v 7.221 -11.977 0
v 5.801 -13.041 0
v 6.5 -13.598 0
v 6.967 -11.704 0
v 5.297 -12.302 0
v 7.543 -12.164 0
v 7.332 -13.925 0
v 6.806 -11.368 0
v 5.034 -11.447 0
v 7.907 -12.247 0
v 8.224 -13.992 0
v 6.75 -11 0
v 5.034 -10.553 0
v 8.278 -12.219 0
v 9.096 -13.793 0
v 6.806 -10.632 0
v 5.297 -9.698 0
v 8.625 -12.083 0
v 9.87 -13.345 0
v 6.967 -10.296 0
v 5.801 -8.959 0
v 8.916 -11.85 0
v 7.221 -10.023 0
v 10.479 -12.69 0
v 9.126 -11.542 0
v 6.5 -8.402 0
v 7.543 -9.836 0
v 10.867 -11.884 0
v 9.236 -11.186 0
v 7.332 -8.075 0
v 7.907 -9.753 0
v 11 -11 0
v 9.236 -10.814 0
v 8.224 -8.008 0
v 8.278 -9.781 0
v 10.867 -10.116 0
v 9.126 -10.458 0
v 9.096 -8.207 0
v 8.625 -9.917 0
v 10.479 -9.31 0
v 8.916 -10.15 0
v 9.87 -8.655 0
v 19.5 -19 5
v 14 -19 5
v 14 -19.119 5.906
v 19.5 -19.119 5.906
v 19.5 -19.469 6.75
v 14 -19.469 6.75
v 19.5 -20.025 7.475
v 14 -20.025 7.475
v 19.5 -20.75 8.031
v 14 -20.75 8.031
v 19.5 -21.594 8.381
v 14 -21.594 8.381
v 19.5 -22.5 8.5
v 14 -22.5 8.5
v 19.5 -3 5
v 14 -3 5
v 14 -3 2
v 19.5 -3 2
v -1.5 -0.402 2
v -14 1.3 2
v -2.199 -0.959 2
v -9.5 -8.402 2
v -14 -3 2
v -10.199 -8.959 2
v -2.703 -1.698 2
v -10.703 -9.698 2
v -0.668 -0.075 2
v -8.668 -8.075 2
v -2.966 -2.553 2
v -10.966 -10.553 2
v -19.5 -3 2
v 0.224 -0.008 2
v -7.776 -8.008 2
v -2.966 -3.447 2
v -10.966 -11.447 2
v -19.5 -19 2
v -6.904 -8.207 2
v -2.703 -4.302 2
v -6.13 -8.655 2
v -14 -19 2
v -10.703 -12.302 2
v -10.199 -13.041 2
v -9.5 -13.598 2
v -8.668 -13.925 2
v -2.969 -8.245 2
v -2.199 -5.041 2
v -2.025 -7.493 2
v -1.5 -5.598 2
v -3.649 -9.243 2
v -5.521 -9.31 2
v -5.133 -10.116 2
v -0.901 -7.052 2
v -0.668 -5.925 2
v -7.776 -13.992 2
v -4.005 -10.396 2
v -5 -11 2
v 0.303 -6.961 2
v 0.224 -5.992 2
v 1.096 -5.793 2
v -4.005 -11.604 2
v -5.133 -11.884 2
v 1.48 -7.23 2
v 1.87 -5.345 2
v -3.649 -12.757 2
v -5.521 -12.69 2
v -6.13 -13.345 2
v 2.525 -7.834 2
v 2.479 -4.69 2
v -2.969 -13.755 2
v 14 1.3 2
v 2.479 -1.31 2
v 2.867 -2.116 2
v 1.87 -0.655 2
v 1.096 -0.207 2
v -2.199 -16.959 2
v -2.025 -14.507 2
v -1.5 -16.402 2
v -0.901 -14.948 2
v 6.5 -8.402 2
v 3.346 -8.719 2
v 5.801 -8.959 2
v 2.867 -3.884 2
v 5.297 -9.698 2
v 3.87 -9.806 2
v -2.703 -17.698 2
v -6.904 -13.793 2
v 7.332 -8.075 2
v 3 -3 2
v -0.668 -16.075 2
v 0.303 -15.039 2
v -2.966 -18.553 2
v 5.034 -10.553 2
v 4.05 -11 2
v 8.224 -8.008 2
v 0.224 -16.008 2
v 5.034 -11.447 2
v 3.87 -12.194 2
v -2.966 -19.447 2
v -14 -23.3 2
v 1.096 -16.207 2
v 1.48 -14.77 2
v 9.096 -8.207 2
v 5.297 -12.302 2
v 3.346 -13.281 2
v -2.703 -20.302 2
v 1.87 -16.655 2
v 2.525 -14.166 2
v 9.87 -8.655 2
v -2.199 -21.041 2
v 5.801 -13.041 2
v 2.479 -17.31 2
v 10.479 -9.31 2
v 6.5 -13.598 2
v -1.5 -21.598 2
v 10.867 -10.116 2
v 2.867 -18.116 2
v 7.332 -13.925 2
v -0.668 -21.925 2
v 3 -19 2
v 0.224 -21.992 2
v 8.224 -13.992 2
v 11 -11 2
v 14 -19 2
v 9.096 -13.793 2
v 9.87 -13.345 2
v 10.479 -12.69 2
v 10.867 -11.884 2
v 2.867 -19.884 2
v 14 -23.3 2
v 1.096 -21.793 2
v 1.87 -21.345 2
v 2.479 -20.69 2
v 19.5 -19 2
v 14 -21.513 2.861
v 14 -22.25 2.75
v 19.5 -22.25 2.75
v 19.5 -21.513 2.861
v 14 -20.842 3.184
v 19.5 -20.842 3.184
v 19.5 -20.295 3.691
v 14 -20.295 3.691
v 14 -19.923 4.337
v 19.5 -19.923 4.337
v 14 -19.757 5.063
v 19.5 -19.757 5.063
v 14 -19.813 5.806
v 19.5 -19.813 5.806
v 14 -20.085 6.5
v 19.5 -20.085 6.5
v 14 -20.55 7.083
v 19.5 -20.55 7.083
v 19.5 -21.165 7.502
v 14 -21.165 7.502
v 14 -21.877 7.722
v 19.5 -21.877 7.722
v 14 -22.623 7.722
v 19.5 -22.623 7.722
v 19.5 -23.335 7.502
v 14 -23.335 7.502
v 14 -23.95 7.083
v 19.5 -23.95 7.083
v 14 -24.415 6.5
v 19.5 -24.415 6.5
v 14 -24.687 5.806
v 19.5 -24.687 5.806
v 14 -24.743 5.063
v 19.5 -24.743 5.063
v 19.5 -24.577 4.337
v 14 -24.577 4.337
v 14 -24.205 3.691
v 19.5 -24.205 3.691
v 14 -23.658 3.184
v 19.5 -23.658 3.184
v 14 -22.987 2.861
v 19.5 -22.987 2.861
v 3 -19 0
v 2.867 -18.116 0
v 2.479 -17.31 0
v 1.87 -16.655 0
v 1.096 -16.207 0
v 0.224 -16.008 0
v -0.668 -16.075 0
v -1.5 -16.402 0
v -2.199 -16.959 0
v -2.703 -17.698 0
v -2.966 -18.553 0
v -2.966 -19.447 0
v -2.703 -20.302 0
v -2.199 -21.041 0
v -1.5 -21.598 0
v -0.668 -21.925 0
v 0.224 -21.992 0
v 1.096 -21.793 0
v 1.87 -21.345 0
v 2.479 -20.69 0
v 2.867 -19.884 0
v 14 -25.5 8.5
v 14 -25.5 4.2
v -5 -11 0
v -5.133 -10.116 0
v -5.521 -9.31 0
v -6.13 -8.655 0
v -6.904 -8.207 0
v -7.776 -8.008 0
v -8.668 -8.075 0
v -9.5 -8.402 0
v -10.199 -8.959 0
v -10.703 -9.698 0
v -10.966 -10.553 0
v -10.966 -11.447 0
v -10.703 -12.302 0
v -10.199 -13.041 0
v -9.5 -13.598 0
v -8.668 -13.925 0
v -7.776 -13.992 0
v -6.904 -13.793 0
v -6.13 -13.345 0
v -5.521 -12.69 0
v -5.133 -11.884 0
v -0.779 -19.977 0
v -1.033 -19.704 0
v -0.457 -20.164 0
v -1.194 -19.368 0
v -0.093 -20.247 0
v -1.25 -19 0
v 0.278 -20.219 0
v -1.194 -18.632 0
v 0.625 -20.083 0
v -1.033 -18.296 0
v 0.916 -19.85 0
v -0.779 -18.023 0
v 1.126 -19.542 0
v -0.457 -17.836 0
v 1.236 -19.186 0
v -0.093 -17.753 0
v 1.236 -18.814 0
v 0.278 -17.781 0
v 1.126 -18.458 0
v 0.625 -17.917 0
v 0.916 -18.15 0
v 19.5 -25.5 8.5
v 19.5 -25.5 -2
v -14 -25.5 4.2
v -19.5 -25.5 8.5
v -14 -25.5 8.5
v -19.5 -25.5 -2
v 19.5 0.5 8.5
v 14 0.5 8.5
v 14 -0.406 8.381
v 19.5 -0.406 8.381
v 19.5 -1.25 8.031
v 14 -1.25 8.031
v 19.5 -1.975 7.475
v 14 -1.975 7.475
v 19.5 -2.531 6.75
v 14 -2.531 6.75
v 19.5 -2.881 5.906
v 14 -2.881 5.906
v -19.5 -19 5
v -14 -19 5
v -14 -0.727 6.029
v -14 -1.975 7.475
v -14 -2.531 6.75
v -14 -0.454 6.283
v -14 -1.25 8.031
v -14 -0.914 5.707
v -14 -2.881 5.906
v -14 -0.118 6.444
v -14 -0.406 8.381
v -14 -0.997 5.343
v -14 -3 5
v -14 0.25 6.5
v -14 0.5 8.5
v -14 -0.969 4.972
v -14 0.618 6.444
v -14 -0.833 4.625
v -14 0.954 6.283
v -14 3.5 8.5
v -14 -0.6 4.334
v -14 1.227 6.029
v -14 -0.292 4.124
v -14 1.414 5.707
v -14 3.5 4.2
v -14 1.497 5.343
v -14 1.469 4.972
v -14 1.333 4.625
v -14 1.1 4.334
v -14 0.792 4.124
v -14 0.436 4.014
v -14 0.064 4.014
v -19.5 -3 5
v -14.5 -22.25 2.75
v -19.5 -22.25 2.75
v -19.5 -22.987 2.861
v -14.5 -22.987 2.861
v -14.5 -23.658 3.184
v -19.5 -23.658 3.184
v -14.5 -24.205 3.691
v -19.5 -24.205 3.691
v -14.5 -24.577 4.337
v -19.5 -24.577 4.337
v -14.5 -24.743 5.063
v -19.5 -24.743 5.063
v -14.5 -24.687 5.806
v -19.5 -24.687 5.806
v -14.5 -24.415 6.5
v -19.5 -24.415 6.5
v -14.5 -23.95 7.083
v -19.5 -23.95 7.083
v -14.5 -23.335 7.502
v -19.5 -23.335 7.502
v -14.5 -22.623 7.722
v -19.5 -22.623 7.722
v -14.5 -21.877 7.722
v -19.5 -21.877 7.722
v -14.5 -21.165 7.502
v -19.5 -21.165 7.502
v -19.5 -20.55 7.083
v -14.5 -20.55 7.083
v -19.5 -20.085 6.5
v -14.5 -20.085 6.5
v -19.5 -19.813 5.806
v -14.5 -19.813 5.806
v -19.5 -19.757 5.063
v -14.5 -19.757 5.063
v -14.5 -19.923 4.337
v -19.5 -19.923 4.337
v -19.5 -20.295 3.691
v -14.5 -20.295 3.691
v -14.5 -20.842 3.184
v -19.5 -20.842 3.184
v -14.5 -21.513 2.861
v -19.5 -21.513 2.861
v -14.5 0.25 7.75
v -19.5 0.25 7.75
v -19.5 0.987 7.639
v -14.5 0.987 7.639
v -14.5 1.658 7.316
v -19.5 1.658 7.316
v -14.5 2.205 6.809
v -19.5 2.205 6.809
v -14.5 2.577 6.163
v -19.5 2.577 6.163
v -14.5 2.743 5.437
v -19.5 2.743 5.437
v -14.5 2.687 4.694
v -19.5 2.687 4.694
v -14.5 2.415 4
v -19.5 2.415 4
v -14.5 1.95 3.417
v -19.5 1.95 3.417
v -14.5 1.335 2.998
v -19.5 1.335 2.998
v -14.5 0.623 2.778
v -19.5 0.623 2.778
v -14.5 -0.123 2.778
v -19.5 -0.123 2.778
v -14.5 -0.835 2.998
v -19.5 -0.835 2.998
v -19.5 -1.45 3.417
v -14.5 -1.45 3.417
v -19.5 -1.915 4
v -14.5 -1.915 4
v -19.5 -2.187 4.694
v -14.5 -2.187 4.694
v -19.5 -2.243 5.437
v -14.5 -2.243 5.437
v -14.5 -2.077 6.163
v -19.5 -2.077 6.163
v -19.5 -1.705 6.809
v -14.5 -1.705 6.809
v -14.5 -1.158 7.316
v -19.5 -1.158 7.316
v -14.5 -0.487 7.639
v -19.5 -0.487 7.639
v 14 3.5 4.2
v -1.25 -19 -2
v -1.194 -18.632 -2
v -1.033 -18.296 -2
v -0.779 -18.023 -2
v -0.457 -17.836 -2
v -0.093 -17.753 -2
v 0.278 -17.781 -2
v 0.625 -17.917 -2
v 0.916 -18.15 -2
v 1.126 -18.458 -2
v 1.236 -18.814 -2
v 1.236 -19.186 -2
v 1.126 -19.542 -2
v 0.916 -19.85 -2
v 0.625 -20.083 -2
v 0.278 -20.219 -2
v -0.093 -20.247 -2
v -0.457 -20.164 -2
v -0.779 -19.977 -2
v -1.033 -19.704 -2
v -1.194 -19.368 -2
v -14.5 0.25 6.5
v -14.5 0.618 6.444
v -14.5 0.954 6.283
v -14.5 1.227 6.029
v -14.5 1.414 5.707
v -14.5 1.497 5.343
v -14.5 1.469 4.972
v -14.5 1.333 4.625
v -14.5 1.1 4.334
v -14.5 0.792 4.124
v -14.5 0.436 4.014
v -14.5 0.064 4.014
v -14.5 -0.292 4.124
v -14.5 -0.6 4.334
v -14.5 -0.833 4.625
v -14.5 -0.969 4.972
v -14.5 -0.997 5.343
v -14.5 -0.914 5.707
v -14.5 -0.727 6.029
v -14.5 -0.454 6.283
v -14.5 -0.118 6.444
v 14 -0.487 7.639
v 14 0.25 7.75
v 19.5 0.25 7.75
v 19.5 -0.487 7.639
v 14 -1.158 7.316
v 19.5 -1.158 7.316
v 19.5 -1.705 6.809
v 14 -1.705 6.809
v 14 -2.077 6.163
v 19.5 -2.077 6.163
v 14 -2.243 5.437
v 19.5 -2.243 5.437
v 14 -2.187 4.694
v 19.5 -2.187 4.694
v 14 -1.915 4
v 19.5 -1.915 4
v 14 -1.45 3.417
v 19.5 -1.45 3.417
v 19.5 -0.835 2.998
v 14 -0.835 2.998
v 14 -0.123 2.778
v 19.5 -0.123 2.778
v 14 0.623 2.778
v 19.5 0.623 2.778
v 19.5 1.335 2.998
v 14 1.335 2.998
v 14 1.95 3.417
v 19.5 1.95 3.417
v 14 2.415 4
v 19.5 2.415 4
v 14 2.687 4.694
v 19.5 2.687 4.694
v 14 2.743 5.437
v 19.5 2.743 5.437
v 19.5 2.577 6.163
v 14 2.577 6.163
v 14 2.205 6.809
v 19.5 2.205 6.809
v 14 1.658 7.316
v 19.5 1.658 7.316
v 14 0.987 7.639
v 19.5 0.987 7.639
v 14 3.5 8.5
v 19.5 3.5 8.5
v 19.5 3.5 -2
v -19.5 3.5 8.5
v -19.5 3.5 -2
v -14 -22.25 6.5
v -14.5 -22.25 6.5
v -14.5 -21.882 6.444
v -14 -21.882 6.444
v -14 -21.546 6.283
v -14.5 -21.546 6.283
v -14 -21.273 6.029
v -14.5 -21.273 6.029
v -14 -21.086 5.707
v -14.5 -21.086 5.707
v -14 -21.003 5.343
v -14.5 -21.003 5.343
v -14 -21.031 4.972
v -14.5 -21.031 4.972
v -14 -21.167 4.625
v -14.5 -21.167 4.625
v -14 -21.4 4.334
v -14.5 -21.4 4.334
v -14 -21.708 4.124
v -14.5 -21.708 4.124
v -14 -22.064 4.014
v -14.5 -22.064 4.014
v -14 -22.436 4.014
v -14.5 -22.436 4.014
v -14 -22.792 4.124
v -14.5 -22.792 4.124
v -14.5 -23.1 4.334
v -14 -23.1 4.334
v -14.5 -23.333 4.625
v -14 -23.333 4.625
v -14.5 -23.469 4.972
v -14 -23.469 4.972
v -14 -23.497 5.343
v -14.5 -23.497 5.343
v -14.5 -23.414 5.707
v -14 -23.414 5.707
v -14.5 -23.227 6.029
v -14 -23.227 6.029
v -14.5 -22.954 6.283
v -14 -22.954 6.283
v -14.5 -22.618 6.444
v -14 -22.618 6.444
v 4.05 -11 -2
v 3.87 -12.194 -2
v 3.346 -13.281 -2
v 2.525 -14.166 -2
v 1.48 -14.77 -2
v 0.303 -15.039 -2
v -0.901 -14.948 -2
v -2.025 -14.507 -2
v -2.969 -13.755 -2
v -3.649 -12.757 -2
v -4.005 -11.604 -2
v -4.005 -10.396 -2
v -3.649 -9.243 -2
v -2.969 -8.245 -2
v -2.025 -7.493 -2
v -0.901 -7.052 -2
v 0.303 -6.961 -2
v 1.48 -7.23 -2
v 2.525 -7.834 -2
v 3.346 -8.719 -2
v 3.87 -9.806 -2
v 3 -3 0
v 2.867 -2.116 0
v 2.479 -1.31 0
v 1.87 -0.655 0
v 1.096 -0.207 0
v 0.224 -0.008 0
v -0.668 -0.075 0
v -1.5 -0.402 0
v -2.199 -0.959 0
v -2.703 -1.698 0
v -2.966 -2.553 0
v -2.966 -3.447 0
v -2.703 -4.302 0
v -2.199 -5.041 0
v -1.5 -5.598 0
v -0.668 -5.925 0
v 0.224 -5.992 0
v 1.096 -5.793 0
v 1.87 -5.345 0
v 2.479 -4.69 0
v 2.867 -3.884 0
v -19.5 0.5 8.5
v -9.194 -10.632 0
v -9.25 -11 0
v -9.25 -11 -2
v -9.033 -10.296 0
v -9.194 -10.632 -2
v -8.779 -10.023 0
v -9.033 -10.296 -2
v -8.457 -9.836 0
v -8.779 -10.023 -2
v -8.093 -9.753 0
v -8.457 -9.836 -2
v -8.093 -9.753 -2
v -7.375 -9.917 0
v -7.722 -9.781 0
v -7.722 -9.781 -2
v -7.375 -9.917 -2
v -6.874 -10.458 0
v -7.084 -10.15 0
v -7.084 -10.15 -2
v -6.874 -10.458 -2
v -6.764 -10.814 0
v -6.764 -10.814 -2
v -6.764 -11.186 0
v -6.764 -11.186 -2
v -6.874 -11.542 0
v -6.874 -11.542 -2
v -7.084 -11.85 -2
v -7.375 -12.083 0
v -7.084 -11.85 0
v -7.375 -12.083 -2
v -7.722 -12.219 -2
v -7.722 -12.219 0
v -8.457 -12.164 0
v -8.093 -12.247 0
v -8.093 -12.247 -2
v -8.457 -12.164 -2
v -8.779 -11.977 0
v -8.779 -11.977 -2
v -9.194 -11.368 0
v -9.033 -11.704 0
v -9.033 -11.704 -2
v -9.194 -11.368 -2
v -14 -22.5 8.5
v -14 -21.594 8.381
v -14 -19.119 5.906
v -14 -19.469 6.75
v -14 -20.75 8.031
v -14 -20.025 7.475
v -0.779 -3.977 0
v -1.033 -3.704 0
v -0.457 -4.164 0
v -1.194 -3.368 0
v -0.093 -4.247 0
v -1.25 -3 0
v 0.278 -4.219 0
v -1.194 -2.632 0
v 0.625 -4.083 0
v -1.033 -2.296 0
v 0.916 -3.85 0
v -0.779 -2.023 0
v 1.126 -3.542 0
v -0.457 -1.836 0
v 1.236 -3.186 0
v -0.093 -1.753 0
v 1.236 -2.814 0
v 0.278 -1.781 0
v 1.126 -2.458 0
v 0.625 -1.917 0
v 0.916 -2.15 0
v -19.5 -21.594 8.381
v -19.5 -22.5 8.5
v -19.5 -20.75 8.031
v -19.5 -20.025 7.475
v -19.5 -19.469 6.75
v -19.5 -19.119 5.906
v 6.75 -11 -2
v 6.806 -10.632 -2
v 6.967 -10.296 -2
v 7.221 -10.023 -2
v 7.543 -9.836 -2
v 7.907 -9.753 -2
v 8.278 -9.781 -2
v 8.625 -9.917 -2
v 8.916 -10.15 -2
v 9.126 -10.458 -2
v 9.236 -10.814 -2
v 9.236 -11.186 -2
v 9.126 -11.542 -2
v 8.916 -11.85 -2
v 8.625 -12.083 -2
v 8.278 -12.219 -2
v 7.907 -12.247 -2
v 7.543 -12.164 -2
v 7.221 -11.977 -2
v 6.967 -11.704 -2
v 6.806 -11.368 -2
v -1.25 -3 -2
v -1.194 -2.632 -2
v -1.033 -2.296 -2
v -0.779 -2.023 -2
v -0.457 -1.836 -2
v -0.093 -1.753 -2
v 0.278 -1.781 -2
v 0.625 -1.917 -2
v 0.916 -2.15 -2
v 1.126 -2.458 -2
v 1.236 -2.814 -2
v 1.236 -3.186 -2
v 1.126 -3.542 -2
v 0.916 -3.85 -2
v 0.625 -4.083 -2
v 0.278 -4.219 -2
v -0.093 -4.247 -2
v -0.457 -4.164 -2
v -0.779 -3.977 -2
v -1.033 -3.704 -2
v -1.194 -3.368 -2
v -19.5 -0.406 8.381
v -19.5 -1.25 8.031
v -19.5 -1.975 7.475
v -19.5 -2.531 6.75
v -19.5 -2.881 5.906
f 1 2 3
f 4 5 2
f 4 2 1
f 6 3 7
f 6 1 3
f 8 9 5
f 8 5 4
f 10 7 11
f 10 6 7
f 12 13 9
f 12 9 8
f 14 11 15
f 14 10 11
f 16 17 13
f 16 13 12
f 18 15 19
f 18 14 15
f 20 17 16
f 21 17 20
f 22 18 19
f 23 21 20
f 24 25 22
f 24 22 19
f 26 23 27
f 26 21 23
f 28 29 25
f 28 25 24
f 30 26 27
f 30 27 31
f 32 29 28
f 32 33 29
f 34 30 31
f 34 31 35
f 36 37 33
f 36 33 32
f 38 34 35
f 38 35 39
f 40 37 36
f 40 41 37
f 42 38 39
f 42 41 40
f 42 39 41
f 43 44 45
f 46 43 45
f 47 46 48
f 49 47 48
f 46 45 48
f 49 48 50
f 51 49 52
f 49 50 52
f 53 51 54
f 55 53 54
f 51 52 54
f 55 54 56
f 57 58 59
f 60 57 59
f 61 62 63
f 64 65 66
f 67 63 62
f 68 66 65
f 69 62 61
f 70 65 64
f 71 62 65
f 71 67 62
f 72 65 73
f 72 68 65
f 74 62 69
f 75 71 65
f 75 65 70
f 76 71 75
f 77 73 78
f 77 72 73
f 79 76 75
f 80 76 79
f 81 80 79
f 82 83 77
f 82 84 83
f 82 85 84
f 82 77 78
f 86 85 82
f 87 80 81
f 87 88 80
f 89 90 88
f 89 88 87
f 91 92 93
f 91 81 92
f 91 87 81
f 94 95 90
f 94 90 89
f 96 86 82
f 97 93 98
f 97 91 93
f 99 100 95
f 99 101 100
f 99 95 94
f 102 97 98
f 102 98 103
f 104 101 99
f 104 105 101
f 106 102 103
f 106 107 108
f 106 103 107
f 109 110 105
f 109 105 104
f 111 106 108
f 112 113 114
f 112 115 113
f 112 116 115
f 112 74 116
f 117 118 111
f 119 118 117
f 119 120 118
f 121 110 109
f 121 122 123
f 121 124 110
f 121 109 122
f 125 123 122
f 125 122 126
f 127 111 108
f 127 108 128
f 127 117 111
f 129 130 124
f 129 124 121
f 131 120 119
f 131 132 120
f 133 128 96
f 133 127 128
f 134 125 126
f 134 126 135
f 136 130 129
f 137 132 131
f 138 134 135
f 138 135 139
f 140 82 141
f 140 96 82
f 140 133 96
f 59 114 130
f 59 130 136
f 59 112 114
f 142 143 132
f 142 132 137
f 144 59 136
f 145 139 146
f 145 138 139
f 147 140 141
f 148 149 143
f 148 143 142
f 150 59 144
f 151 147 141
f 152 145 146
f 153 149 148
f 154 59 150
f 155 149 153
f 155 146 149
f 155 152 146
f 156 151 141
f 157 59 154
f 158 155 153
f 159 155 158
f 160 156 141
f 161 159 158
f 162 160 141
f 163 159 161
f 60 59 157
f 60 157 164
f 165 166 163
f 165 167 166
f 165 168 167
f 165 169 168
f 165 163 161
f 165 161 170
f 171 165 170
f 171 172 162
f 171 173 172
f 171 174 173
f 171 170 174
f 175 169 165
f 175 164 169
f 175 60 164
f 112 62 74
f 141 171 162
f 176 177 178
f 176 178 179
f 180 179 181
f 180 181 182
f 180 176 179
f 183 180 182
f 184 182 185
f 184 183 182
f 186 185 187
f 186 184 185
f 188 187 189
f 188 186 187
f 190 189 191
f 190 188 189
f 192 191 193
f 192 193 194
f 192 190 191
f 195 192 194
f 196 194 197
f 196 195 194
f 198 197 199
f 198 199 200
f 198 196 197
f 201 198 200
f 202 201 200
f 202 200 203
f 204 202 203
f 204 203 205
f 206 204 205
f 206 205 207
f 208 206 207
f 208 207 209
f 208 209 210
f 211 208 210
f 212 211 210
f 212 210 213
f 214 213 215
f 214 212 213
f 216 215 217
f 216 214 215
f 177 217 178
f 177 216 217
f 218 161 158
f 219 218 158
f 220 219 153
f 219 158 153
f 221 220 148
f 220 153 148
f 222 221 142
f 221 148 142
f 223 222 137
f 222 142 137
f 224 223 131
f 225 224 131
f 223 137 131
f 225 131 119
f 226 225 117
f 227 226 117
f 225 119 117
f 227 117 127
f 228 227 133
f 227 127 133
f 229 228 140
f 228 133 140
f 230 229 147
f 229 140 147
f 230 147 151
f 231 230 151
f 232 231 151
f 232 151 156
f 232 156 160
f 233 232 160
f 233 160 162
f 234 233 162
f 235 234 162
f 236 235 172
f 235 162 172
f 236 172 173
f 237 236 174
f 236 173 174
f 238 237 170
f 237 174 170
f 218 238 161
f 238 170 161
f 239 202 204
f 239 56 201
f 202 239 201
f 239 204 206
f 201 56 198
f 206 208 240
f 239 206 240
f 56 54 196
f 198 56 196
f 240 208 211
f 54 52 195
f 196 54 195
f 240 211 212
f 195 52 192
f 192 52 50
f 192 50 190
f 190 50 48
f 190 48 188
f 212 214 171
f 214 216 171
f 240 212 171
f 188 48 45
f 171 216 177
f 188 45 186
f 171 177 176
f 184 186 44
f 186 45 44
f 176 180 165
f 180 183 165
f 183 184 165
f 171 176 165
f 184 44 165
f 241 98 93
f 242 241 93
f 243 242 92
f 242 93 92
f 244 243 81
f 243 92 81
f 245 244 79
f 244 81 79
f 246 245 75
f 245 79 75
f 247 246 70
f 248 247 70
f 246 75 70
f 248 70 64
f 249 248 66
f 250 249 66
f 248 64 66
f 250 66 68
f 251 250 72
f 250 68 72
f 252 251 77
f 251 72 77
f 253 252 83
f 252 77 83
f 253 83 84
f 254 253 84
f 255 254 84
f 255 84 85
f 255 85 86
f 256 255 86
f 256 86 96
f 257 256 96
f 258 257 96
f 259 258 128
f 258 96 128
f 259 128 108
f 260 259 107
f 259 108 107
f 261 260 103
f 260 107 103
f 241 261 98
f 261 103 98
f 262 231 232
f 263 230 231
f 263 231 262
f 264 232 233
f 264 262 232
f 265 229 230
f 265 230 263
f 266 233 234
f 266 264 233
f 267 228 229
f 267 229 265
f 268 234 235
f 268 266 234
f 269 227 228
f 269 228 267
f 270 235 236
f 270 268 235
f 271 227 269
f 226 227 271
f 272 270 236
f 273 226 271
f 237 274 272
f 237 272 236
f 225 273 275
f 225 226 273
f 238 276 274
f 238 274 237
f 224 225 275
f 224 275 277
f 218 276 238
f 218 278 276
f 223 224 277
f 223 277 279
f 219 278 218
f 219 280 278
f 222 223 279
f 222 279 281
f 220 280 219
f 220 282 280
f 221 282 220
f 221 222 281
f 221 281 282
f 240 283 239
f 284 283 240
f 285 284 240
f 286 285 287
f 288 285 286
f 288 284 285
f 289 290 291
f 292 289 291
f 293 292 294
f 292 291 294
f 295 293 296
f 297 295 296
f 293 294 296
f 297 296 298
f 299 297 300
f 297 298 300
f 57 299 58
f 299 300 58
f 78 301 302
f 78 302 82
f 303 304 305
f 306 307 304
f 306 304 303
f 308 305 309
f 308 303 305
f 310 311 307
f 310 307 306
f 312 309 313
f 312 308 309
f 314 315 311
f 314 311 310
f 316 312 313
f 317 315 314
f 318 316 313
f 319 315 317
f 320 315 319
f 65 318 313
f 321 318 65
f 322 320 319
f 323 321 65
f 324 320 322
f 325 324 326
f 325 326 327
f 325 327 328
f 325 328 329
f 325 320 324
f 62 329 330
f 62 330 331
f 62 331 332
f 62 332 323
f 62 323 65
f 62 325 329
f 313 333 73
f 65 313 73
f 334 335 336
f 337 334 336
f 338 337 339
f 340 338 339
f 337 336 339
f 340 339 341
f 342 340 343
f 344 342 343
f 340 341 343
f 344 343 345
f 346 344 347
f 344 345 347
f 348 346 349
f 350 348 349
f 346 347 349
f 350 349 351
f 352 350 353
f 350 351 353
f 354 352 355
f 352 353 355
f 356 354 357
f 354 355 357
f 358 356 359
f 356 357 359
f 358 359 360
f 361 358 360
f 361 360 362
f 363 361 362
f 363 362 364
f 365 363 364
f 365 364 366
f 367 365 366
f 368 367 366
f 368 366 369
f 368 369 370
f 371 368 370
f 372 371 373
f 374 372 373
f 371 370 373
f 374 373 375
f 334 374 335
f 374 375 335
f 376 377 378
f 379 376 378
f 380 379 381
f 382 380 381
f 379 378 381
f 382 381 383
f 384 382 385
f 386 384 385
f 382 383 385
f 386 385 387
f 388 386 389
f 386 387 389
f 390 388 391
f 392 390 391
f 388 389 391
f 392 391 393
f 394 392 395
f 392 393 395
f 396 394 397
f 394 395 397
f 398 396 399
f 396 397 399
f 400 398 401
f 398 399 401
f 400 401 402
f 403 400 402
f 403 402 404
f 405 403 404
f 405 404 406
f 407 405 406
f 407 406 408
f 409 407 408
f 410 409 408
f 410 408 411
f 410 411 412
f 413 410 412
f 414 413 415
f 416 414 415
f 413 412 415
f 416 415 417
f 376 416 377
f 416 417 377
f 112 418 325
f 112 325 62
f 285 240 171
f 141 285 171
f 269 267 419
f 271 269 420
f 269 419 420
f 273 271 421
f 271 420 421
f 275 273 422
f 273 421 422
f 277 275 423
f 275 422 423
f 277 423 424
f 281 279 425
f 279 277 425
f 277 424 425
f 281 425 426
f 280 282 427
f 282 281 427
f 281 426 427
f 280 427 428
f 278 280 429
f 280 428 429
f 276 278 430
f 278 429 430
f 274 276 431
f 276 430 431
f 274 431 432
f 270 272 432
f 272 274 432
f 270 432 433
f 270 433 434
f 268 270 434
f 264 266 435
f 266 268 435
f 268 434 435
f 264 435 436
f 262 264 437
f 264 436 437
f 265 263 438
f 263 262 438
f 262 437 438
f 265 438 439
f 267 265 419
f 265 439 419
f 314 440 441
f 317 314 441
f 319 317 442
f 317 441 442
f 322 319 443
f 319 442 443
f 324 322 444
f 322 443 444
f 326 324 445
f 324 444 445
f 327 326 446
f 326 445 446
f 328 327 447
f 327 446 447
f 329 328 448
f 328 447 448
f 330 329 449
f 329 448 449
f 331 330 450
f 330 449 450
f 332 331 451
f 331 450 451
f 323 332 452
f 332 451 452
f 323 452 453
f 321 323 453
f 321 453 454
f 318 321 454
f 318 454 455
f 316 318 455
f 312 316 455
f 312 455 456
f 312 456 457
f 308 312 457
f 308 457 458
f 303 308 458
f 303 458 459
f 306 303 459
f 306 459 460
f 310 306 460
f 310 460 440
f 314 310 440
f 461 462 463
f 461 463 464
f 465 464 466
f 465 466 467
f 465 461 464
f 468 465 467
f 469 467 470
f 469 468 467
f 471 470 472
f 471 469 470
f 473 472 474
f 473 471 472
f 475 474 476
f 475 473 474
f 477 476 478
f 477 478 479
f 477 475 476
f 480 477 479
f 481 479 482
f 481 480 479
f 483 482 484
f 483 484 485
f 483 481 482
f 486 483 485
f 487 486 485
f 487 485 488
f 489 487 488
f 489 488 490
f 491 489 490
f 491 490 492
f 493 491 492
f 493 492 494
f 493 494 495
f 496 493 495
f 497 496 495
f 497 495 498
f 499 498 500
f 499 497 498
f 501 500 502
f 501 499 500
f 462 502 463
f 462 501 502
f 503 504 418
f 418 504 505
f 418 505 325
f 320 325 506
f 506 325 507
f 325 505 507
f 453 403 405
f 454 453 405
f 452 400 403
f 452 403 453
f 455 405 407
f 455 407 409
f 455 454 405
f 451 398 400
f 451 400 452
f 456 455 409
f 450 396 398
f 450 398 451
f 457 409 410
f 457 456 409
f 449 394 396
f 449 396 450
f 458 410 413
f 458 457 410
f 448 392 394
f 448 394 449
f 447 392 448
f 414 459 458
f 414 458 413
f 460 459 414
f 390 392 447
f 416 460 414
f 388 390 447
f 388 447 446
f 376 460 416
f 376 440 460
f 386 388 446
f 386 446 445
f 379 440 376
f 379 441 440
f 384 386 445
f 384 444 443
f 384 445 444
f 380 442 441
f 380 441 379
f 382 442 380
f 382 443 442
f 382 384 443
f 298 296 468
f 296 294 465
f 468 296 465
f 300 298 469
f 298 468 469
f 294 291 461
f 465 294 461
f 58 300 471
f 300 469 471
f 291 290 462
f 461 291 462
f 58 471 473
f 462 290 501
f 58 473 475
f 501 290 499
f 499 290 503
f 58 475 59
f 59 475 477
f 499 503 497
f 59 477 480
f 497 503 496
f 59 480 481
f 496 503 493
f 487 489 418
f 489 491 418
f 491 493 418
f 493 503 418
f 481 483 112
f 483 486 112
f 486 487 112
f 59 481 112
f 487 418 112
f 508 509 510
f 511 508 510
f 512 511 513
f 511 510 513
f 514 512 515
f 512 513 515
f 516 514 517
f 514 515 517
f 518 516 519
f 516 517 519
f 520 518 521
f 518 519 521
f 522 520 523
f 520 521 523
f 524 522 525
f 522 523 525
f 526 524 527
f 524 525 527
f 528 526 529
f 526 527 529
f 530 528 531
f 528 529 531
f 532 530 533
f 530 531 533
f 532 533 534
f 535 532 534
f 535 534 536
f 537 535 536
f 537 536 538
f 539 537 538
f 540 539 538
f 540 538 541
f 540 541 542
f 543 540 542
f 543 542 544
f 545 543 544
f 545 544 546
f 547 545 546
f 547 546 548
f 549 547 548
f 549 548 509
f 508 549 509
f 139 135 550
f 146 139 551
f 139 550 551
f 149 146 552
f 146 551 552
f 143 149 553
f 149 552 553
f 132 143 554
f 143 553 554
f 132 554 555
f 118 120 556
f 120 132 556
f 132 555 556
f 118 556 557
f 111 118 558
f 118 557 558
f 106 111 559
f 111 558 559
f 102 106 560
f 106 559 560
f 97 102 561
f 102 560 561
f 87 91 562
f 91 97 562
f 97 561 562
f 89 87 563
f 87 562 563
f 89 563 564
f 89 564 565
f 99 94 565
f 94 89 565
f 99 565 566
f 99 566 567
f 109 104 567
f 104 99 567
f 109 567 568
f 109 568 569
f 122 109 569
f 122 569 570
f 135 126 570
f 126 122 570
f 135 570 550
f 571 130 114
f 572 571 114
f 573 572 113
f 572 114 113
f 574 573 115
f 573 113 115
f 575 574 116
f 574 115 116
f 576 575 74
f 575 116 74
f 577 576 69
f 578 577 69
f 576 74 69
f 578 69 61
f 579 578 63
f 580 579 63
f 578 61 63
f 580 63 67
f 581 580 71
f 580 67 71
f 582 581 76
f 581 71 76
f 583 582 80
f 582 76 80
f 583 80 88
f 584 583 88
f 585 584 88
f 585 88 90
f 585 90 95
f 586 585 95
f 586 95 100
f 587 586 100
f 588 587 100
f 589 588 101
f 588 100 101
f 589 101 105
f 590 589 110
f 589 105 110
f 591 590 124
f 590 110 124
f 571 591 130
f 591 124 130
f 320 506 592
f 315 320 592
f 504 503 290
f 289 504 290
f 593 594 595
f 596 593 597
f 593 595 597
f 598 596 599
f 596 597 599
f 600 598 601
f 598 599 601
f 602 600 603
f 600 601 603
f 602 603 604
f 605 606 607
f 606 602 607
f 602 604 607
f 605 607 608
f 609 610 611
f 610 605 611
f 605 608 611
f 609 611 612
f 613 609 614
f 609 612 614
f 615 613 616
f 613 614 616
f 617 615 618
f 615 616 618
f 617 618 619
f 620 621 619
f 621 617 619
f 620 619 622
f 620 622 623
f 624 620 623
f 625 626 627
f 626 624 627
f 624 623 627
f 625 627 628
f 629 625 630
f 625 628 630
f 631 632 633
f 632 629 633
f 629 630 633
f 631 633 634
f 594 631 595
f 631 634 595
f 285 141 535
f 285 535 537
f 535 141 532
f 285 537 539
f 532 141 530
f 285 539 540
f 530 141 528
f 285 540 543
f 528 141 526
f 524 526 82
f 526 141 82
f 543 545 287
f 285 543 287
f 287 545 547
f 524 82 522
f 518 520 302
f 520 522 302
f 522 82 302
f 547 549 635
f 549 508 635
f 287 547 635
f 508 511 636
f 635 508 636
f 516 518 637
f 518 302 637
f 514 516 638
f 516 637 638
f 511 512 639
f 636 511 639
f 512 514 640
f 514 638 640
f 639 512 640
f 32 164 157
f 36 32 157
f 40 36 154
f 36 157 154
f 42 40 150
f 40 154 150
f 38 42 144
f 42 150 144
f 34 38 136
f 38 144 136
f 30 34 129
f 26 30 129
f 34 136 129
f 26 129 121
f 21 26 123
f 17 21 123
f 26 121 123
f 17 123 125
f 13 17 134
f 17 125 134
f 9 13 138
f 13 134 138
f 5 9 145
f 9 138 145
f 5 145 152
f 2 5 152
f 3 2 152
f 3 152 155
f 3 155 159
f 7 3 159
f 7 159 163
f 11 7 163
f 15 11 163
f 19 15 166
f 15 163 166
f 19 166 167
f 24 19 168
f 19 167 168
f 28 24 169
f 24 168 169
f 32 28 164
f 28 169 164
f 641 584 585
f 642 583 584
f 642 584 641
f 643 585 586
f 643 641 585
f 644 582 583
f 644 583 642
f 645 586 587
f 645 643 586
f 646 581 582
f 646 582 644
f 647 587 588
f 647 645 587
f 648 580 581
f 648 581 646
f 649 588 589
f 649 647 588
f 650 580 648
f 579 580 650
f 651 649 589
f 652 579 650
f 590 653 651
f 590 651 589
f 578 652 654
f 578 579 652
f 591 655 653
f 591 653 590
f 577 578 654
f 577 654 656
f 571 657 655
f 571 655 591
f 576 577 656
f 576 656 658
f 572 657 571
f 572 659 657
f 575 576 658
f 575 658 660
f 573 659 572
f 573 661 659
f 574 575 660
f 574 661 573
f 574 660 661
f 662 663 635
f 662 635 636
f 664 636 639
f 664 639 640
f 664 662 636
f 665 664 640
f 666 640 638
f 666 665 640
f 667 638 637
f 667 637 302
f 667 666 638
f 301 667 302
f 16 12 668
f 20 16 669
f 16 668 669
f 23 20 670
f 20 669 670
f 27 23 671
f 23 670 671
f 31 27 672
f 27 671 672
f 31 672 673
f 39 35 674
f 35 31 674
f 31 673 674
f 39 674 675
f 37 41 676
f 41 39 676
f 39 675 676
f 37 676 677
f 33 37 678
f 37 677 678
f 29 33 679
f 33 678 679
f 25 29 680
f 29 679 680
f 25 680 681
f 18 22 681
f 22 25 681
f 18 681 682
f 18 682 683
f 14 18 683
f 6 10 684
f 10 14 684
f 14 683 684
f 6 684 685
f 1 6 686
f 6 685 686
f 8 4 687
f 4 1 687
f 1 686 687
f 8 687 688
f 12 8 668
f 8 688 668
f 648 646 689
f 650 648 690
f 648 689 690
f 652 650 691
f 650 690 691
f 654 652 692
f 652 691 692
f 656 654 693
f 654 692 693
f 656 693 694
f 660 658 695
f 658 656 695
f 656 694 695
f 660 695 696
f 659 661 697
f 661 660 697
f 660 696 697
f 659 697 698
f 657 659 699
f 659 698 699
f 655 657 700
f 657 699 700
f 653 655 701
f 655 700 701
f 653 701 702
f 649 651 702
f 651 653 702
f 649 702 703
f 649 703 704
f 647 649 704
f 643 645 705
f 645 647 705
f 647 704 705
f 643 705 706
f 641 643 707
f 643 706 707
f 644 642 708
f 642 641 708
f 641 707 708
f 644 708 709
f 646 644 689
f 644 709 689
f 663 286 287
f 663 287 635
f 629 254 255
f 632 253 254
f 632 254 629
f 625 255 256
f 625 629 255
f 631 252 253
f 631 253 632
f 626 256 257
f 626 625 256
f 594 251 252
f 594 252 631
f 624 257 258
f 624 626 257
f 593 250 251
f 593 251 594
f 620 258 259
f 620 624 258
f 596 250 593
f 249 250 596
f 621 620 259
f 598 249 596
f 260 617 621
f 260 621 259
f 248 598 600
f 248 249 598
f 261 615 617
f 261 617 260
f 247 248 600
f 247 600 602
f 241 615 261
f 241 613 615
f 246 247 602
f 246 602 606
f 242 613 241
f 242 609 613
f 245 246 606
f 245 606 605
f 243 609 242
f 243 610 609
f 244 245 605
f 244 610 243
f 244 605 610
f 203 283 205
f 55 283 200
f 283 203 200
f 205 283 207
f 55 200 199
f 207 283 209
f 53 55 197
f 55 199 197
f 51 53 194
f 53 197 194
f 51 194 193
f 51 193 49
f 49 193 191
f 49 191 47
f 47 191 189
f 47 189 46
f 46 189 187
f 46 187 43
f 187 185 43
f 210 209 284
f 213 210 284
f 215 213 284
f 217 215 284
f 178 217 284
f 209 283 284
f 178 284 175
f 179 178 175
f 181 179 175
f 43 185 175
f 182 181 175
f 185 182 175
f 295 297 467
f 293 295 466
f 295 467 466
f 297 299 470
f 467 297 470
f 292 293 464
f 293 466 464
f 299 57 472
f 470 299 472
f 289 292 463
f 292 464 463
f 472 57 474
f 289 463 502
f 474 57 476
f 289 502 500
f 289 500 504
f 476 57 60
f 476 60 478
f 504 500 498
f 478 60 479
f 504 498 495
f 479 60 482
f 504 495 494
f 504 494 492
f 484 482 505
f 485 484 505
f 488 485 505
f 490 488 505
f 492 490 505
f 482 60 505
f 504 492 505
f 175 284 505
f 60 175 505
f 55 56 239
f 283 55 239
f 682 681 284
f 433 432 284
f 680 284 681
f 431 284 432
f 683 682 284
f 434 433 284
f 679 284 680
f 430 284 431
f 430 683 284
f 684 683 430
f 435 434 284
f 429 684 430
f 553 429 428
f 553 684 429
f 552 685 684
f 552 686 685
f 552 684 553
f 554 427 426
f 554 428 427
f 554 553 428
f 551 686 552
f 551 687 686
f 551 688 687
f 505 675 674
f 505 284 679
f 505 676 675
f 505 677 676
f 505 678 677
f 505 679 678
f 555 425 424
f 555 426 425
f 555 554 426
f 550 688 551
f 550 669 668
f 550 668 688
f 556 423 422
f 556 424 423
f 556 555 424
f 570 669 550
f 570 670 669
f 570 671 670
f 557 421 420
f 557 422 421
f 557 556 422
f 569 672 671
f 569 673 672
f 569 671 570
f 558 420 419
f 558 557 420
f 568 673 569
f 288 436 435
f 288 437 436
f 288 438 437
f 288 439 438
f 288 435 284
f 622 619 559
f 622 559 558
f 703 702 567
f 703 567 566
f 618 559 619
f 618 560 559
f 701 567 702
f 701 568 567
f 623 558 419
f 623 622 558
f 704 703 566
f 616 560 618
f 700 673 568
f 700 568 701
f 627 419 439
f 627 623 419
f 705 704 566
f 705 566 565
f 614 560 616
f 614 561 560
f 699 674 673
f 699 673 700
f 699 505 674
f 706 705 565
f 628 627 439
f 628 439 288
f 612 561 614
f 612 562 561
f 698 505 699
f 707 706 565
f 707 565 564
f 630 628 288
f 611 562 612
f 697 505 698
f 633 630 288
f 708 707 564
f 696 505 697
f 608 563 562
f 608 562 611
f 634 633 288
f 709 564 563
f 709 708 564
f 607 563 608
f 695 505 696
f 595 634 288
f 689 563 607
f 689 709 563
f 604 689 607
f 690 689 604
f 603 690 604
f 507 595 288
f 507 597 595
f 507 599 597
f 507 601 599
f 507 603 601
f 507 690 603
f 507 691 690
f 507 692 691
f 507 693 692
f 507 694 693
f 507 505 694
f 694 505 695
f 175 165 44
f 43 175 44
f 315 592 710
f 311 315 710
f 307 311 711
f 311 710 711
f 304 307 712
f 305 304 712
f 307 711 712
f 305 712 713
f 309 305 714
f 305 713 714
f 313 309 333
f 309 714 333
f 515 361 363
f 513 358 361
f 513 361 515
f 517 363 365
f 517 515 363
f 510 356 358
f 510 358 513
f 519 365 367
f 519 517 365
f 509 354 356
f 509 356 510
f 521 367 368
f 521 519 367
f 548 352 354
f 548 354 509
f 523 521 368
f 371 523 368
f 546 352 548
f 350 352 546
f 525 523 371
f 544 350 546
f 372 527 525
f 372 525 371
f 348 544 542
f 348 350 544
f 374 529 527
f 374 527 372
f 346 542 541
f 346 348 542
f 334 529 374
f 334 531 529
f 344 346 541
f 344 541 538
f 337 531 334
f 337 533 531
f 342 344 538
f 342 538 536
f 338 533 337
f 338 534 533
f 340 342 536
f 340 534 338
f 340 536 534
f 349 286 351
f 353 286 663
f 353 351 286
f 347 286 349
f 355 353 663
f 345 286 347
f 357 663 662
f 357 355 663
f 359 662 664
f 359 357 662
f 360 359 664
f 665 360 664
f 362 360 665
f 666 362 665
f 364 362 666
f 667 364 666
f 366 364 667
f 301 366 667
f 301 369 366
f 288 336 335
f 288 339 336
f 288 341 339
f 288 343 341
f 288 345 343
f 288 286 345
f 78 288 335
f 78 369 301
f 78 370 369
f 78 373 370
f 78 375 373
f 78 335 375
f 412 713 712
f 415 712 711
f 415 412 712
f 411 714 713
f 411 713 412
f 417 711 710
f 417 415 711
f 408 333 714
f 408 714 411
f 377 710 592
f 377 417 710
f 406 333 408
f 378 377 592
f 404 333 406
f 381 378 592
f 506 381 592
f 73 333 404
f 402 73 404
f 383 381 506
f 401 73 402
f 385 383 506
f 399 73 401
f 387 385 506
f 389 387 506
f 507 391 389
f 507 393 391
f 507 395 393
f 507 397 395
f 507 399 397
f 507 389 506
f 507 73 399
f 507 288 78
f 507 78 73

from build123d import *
from build123d.topology import SkipClean

# Parameters (mm, degrees)
SKETCH1_W           = 39
SKETCH1_H           = 23.712741858
BOSS_EXTRUDE1_DEPTH = 2
SKETCH9_R           = 4.05
CUT_EXTRUDE6_DEPTH  = 5
SKETCH10_R          = 1.25
BOSS_EXTRUDE5_DEPTH = 5.5
SKETCH11_R          = 2.5
CUT_EXTRUDE7_DEPTH  = 5
BOSS_EXTRUDE6_START = -5.5
SKETCH12_R          = 2.5
BOSS_EXTRUDE6_DEPTH = 5.5
BOSS_EXTRUDE7_DEPTH = 28
BOSS_EXTRUDE8_START = 2
SKETCH14_W          = 39
SKETCH14_H          = 29
SKETCH14_R          = 1.25
SKETCH14_R_2        = 4.05
BOSS_EXTRUDE8_DEPTH = 2
SKETCH15_R          = 3
CUT_EXTRUDE8_DEPTH  = 2


with BuildPart() as part:
    # Sketch1 → Boss-Extrude1 (new body)
    with BuildSketch(Plane.XY):
        with Locations((0, -11)):
            Rectangle(SKETCH1_W, SKETCH1_H)
        with BuildLine():
            ThreePointArc((1.25, -19), (0, -17.75), (-1.25, -19))
            ThreePointArc((-1.25, -19), (0, -20.25), (1.25, -19))
        make_face(mode=Mode.SUBTRACT)
        with BuildLine():
            ThreePointArc((-6.75, -11), (-8, -9.75), (-9.25, -11))
            ThreePointArc((-9.25, -11), (-8, -12.25), (-6.75, -11))
        make_face(mode=Mode.SUBTRACT)
        with BuildLine():
            ThreePointArc((1.25, -3), (0, -1.75), (-1.25, -3))
            ThreePointArc((-1.25, -3), (0, -4.25), (1.25, -3))
        make_face(mode=Mode.SUBTRACT)
        with BuildLine():
            ThreePointArc((9.25, -11), (8, -9.75), (6.75, -11))
            ThreePointArc((6.75, -11), (8, -12.25), (9.25, -11))
        make_face(mode=Mode.SUBTRACT)
    extrude(amount=BOSS_EXTRUDE1_DEPTH)

    # Sketch9 → Cut-Extrude6 (cut)
    with BuildSketch(Plane.XY.offset(2)):
        with Locations((0, -11)):
            Circle(SKETCH9_R)
    extrude(amount=-CUT_EXTRUDE6_DEPTH, mode=Mode.SUBTRACT)

    # Sketch10 → Boss-Extrude5 (add)
    # profile 1 of 2: a face of its own
    with BuildSketch(Plane.ZY.offset(19.5)):
        with BuildLine():
            Line((4.2, 3.5), (8.5, 3.5))
            Line((8.5, 3.5), (8.5, 0.5))
            ThreePointArc((8.5, 0.5), (7.474873734, -1.974873734), (5, -3))
            Line((5, -3), (2, -3))
            Line((2, -3), (2, 0.856370929))
            Line((2, 0.856370929), (0, 0.856370929))
            Line((0, 0.856370929), (0, 3.5))
            Line((0, 3.5), (4.2, 3.5))
        make_face()
        with Locations((5.25, 0.25)):
            Circle(SKETCH10_R, mode=Mode.SUBTRACT)
    # profile 2 of 2: a face of its own
    with BuildSketch(Plane.ZY.offset(19.5)):
        with BuildLine():
            Line((5, -19), (2, -19))
            Line((2, -19), (2, -22.856370929))
            Line((2, -22.856370929), (0, -22.856370929))
            Line((0, -22.856370929), (0, -25.5))
            Line((0, -25.5), (4.2, -25.5))
            Line((4.2, -25.5), (8.5, -25.5))
            Line((8.5, -25.5), (8.5, -22.5))
            ThreePointArc((8.5, -22.5), (7.474873734, -20.025126266), (5, -19))
        make_face()
        with Locations((5.25, -22.25)):
            Circle(SKETCH10_R, mode=Mode.SUBTRACT)
    extrude(amount=-BOSS_EXTRUDE5_DEPTH)

    # Sketch11 → Cut-Extrude7 (cut)
    with BuildSketch(Plane.ZY.offset(19.5)):
        with Locations((5.25, 0.25)):
            Circle(SKETCH11_R)
        with Locations(Location((5.25, -22.25, 0), (0, 0, 180))):
            Circle(SKETCH11_R)
    extrude(amount=-CUT_EXTRUDE7_DEPTH, mode=Mode.SUBTRACT)

    # Sketch12 → Boss-Extrude6 (add)
    with BuildSketch(Plane(origin=(19.5, 0, 0), x_dir=(0, 0, -1), z_dir=(1, 0, 0)).offset(BOSS_EXTRUDE6_START)):
        with BuildLine():
            ThreePointArc((-8.5, 0.5), (-7.474873734, -1.974873734), (-5, -3))
            Line((-5, -3), (-2, -3))
            Line((-2, -3), (-2, -19))
            Line((-2, -19), (-5, -19))
            ThreePointArc((-5, -19), (-7.474873734, -20.025126266), (-8.5, -22.5))
            Line((-8.5, -22.5), (-8.5, -25.5))
            Line((-8.5, -25.5), (0, -25.5))
            Line((0, -25.5), (0, 3.5))
            Line((0, 3.5), (-8.5, 3.5))
            Line((-8.5, 3.5), (-8.5, 0.5))
        make_face()
        with Locations((-5.25, -22.25)):
            Circle(SKETCH12_R, mode=Mode.SUBTRACT)
        with Locations(Location((-5.25, 0.25, 0), (0, 0, 180))):
            Circle(SKETCH12_R, mode=Mode.SUBTRACT)
    extrude(amount=BOSS_EXTRUDE6_DEPTH)

    # Sketch13 → Boss-Extrude7 (add)
    with BuildSketch(Plane.ZY.offset(-14)):
        Polygon((0, 3.5), (4.2, 3.5), (2, 1.3), (2, 0.856370929), (0, 0.856370929), align=None)
        Polygon((2, -22.856370929), (0, -22.856370929), (0, -25.5), (4.2, -25.5), (2, -23.3), align=None)
    extrude(amount=BOSS_EXTRUDE7_DEPTH)

    # Sketch14 → Boss-Extrude8 (add)
    with SkipClean():  # the faces are left unmerged after this step: merging them gives an invalid solid
        with BuildSketch(Plane(origin=(0, 0, 0), x_dir=(-1, 0, 0), z_dir=(0, 0, -1)).offset(BOSS_EXTRUDE8_START)):
            with Locations((0, -11)):
                Rectangle(SKETCH14_W, SKETCH14_H)
            with Locations((0, -19)):
                Circle(SKETCH14_R, mode=Mode.SUBTRACT)
            with Locations((8, -11)):
                Circle(SKETCH14_R, mode=Mode.SUBTRACT)
            with Locations((0, -3)):
                Circle(SKETCH14_R, mode=Mode.SUBTRACT)
            with Locations(Location((0, -11, 0), (0, 0, 180))):
                Circle(SKETCH14_R_2, mode=Mode.SUBTRACT)
            with Locations((-8, -11)):
                Circle(SKETCH14_R, mode=Mode.SUBTRACT)
        extrude(amount=-BOSS_EXTRUDE8_DEPTH)

    # Sketch15 → Cut-Extrude8 (cut)
    with BuildSketch(Plane.XY.offset(2)):
        with Locations((0, -3)):
            Circle(SKETCH15_R)
        with Locations((8, -11)):
            Circle(SKETCH15_R)
        with Locations((0, -19)):
            Circle(SKETCH15_R)
        with Locations((-8, -11)):
            Circle(SKETCH15_R)
    extrude(amount=-CUT_EXTRUDE8_DEPTH, mode=Mode.SUBTRACT)


solid = part.part
